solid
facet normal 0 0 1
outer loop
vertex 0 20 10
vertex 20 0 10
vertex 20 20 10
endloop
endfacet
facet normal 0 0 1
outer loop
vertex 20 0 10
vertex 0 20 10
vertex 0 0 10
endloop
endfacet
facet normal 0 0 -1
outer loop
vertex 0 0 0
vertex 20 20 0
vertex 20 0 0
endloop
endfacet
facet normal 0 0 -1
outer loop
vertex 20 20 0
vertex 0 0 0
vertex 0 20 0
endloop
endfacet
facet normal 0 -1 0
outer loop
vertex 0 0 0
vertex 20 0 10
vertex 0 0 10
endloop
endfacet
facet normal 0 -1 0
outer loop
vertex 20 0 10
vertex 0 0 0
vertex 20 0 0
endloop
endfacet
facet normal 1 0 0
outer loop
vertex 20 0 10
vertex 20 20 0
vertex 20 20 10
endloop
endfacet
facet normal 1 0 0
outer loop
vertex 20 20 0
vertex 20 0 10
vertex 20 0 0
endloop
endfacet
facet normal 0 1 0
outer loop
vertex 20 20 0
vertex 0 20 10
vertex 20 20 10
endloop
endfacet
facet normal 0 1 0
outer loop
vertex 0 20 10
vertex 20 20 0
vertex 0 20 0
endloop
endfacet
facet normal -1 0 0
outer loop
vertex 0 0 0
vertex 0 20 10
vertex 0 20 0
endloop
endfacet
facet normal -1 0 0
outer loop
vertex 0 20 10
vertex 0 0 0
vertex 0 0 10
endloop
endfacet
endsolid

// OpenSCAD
// A box and a screw that is not printed: a reference part.
// The % mark keeps the screw out of the export, as in OpenSCAD. CoCAD shows
// it in transparent gray in the Model tab, and the Parts card marks it
// "not printed". It is not in the export, the slice or the render.

module box() cube([20, 20, 10]);
module screw() translate([10, 10, 0]) cylinder(d = 3, h = 30, $fn = 16);

box();
%screw();
